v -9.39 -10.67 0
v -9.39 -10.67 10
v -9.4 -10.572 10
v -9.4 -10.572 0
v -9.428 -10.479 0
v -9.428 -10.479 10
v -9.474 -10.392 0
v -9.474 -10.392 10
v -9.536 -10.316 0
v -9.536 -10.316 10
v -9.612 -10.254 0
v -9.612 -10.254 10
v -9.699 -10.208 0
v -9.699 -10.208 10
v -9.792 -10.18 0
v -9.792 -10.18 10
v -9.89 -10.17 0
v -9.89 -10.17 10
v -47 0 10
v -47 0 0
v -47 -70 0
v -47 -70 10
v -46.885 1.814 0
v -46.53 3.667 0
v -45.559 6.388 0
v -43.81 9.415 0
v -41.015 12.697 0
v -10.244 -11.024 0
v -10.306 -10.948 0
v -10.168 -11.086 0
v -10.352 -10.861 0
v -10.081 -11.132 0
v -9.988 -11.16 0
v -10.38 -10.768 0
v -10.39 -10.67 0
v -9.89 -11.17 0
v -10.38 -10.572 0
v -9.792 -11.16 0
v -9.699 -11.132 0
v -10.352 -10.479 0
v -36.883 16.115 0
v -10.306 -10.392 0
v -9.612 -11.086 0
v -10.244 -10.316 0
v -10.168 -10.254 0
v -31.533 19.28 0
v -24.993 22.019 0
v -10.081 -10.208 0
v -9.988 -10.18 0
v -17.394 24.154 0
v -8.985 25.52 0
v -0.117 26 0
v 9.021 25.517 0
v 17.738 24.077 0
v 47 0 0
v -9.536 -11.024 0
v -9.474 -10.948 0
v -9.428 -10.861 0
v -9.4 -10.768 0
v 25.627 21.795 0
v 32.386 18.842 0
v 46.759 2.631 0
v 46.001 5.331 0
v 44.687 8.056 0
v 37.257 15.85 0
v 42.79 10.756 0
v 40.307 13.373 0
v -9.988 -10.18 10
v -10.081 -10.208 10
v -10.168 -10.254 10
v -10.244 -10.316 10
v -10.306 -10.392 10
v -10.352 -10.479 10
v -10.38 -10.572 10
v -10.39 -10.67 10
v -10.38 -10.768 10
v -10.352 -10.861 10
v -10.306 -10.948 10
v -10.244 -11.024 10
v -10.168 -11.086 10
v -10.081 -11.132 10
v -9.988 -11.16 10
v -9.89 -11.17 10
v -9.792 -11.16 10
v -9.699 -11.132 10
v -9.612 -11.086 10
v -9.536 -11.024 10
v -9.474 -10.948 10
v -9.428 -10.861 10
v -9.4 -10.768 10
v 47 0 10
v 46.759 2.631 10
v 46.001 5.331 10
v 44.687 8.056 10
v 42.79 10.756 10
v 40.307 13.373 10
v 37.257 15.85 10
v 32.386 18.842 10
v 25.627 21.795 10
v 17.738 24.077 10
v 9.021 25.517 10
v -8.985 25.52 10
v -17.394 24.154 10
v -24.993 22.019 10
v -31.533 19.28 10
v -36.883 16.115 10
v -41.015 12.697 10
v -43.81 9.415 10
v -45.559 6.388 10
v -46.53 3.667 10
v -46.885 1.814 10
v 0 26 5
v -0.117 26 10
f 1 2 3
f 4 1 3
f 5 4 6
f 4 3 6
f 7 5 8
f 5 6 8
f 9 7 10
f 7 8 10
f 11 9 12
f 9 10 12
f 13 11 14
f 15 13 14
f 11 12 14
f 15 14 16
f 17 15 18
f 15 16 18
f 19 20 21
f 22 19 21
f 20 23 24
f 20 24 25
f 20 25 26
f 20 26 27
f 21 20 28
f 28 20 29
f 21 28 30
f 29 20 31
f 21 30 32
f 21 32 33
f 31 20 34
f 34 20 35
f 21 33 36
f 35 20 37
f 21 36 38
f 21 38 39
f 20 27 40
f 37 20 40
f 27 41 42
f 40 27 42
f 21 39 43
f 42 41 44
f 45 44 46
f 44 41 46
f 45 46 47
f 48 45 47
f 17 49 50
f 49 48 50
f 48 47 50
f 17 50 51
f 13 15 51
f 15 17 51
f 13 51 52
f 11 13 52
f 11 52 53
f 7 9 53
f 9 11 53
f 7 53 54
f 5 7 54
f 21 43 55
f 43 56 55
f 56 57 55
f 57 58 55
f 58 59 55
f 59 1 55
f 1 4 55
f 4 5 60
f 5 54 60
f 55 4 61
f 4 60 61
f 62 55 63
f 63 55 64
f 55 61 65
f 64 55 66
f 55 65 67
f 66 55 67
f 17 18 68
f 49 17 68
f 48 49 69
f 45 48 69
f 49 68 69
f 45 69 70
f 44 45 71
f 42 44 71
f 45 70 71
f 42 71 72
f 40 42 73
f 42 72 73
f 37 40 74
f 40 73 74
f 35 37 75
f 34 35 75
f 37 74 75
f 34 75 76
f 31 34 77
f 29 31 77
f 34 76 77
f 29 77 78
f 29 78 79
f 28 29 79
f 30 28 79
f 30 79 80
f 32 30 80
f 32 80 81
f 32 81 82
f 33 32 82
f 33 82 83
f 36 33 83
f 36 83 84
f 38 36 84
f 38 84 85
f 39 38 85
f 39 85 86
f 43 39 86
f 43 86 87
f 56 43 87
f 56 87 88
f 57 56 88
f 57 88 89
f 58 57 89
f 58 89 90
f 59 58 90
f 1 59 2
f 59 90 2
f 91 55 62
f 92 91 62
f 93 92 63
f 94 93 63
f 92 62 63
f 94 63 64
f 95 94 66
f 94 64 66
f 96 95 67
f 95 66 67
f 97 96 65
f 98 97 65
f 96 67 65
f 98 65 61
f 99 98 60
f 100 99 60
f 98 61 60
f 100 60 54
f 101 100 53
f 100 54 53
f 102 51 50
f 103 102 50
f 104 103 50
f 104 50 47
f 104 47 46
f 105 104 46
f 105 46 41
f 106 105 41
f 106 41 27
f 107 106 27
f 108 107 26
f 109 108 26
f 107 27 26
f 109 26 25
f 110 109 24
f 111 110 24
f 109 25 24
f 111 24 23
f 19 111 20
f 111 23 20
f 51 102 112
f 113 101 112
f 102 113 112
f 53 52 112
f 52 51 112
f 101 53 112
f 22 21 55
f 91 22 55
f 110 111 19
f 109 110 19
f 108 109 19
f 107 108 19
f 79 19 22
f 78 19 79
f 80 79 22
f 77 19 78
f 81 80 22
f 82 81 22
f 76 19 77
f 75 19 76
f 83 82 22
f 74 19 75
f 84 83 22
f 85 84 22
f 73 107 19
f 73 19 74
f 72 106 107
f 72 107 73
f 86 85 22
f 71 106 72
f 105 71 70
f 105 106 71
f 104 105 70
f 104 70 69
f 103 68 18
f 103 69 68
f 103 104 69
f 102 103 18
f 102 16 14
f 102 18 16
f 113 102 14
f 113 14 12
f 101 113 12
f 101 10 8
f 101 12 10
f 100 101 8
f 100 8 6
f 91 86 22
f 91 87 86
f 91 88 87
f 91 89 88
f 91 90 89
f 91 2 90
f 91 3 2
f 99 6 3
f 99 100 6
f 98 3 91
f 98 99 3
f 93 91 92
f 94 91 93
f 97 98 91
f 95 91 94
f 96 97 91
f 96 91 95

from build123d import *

# Parameters (mm, degrees)
F1_DEPTH = 10
F3_DEPTH = 10.0010001


with BuildPart() as f1:
    # F0 (on Top) → F1 (new body)
    with BuildSketch(Plane.XY):
        with BuildLine():
            Line((13.5733824303, -24.89216202), (47, 0))
            add(Edge.make_bspline(
                [(47, 0), (47, 26.0000000061), (-1.1e-08, 26), (-47.0000000221, 25.9999999939), (-47, -1.22e-08)],
                knots=[0, 0, 0, 1.570796327, 1.570796327, 3.1415926541, 3.1415926541, 3.1415926541], degree=2, weights=[1, 0.7071067811, 1, 0.7071067811, 1]))
            add(Edge.make_bspline(
                [(-47, -1.22e-08), (-46.9999999703, -34.999999995), (13.5733824303, -24.89216202)],
                knots=[3.1415926541, 3.1415926541, 3.1415926541, 5.0053573372, 5.0053573372, 5.0053573372], degree=2, weights=[1, 0.5963240015, 1]))
        make_face()
        with BuildLine():
            add(Edge.make_bspline(
                [(-47, -1.22e-08), (-46.9999999703, -34.999999995), (13.5733824303, -24.89216202)],
                knots=[3.1415926541, 3.1415926541, 3.1415926541, 5.0053573372, 5.0053573372, 5.0053573372], degree=2, weights=[1, 0.5963240015, 1]))
            Line((-47, -1.22e-08), (-47, -70))
            Line((-47, -70), (13.5733824303, -24.89216202))
        make_face()
    extrude(amount=F1_DEPTH)

    # F2 (on face) → F3 (cut, through all)
    with BuildSketch(Plane.XY.offset(10)):
        with BuildLine():
            ThreePointArc((-9.89, -10.17), (-10.2435533906, -11.0235533906), (-9.39, -10.67))
            ThreePointArc((-9.39, -10.67), (-9.5364466094, -10.3164466094), (-9.89, -10.17))
        make_face()
    extrude(amount=-F3_DEPTH, mode=Mode.SUBTRACT)


solid = f1.part
